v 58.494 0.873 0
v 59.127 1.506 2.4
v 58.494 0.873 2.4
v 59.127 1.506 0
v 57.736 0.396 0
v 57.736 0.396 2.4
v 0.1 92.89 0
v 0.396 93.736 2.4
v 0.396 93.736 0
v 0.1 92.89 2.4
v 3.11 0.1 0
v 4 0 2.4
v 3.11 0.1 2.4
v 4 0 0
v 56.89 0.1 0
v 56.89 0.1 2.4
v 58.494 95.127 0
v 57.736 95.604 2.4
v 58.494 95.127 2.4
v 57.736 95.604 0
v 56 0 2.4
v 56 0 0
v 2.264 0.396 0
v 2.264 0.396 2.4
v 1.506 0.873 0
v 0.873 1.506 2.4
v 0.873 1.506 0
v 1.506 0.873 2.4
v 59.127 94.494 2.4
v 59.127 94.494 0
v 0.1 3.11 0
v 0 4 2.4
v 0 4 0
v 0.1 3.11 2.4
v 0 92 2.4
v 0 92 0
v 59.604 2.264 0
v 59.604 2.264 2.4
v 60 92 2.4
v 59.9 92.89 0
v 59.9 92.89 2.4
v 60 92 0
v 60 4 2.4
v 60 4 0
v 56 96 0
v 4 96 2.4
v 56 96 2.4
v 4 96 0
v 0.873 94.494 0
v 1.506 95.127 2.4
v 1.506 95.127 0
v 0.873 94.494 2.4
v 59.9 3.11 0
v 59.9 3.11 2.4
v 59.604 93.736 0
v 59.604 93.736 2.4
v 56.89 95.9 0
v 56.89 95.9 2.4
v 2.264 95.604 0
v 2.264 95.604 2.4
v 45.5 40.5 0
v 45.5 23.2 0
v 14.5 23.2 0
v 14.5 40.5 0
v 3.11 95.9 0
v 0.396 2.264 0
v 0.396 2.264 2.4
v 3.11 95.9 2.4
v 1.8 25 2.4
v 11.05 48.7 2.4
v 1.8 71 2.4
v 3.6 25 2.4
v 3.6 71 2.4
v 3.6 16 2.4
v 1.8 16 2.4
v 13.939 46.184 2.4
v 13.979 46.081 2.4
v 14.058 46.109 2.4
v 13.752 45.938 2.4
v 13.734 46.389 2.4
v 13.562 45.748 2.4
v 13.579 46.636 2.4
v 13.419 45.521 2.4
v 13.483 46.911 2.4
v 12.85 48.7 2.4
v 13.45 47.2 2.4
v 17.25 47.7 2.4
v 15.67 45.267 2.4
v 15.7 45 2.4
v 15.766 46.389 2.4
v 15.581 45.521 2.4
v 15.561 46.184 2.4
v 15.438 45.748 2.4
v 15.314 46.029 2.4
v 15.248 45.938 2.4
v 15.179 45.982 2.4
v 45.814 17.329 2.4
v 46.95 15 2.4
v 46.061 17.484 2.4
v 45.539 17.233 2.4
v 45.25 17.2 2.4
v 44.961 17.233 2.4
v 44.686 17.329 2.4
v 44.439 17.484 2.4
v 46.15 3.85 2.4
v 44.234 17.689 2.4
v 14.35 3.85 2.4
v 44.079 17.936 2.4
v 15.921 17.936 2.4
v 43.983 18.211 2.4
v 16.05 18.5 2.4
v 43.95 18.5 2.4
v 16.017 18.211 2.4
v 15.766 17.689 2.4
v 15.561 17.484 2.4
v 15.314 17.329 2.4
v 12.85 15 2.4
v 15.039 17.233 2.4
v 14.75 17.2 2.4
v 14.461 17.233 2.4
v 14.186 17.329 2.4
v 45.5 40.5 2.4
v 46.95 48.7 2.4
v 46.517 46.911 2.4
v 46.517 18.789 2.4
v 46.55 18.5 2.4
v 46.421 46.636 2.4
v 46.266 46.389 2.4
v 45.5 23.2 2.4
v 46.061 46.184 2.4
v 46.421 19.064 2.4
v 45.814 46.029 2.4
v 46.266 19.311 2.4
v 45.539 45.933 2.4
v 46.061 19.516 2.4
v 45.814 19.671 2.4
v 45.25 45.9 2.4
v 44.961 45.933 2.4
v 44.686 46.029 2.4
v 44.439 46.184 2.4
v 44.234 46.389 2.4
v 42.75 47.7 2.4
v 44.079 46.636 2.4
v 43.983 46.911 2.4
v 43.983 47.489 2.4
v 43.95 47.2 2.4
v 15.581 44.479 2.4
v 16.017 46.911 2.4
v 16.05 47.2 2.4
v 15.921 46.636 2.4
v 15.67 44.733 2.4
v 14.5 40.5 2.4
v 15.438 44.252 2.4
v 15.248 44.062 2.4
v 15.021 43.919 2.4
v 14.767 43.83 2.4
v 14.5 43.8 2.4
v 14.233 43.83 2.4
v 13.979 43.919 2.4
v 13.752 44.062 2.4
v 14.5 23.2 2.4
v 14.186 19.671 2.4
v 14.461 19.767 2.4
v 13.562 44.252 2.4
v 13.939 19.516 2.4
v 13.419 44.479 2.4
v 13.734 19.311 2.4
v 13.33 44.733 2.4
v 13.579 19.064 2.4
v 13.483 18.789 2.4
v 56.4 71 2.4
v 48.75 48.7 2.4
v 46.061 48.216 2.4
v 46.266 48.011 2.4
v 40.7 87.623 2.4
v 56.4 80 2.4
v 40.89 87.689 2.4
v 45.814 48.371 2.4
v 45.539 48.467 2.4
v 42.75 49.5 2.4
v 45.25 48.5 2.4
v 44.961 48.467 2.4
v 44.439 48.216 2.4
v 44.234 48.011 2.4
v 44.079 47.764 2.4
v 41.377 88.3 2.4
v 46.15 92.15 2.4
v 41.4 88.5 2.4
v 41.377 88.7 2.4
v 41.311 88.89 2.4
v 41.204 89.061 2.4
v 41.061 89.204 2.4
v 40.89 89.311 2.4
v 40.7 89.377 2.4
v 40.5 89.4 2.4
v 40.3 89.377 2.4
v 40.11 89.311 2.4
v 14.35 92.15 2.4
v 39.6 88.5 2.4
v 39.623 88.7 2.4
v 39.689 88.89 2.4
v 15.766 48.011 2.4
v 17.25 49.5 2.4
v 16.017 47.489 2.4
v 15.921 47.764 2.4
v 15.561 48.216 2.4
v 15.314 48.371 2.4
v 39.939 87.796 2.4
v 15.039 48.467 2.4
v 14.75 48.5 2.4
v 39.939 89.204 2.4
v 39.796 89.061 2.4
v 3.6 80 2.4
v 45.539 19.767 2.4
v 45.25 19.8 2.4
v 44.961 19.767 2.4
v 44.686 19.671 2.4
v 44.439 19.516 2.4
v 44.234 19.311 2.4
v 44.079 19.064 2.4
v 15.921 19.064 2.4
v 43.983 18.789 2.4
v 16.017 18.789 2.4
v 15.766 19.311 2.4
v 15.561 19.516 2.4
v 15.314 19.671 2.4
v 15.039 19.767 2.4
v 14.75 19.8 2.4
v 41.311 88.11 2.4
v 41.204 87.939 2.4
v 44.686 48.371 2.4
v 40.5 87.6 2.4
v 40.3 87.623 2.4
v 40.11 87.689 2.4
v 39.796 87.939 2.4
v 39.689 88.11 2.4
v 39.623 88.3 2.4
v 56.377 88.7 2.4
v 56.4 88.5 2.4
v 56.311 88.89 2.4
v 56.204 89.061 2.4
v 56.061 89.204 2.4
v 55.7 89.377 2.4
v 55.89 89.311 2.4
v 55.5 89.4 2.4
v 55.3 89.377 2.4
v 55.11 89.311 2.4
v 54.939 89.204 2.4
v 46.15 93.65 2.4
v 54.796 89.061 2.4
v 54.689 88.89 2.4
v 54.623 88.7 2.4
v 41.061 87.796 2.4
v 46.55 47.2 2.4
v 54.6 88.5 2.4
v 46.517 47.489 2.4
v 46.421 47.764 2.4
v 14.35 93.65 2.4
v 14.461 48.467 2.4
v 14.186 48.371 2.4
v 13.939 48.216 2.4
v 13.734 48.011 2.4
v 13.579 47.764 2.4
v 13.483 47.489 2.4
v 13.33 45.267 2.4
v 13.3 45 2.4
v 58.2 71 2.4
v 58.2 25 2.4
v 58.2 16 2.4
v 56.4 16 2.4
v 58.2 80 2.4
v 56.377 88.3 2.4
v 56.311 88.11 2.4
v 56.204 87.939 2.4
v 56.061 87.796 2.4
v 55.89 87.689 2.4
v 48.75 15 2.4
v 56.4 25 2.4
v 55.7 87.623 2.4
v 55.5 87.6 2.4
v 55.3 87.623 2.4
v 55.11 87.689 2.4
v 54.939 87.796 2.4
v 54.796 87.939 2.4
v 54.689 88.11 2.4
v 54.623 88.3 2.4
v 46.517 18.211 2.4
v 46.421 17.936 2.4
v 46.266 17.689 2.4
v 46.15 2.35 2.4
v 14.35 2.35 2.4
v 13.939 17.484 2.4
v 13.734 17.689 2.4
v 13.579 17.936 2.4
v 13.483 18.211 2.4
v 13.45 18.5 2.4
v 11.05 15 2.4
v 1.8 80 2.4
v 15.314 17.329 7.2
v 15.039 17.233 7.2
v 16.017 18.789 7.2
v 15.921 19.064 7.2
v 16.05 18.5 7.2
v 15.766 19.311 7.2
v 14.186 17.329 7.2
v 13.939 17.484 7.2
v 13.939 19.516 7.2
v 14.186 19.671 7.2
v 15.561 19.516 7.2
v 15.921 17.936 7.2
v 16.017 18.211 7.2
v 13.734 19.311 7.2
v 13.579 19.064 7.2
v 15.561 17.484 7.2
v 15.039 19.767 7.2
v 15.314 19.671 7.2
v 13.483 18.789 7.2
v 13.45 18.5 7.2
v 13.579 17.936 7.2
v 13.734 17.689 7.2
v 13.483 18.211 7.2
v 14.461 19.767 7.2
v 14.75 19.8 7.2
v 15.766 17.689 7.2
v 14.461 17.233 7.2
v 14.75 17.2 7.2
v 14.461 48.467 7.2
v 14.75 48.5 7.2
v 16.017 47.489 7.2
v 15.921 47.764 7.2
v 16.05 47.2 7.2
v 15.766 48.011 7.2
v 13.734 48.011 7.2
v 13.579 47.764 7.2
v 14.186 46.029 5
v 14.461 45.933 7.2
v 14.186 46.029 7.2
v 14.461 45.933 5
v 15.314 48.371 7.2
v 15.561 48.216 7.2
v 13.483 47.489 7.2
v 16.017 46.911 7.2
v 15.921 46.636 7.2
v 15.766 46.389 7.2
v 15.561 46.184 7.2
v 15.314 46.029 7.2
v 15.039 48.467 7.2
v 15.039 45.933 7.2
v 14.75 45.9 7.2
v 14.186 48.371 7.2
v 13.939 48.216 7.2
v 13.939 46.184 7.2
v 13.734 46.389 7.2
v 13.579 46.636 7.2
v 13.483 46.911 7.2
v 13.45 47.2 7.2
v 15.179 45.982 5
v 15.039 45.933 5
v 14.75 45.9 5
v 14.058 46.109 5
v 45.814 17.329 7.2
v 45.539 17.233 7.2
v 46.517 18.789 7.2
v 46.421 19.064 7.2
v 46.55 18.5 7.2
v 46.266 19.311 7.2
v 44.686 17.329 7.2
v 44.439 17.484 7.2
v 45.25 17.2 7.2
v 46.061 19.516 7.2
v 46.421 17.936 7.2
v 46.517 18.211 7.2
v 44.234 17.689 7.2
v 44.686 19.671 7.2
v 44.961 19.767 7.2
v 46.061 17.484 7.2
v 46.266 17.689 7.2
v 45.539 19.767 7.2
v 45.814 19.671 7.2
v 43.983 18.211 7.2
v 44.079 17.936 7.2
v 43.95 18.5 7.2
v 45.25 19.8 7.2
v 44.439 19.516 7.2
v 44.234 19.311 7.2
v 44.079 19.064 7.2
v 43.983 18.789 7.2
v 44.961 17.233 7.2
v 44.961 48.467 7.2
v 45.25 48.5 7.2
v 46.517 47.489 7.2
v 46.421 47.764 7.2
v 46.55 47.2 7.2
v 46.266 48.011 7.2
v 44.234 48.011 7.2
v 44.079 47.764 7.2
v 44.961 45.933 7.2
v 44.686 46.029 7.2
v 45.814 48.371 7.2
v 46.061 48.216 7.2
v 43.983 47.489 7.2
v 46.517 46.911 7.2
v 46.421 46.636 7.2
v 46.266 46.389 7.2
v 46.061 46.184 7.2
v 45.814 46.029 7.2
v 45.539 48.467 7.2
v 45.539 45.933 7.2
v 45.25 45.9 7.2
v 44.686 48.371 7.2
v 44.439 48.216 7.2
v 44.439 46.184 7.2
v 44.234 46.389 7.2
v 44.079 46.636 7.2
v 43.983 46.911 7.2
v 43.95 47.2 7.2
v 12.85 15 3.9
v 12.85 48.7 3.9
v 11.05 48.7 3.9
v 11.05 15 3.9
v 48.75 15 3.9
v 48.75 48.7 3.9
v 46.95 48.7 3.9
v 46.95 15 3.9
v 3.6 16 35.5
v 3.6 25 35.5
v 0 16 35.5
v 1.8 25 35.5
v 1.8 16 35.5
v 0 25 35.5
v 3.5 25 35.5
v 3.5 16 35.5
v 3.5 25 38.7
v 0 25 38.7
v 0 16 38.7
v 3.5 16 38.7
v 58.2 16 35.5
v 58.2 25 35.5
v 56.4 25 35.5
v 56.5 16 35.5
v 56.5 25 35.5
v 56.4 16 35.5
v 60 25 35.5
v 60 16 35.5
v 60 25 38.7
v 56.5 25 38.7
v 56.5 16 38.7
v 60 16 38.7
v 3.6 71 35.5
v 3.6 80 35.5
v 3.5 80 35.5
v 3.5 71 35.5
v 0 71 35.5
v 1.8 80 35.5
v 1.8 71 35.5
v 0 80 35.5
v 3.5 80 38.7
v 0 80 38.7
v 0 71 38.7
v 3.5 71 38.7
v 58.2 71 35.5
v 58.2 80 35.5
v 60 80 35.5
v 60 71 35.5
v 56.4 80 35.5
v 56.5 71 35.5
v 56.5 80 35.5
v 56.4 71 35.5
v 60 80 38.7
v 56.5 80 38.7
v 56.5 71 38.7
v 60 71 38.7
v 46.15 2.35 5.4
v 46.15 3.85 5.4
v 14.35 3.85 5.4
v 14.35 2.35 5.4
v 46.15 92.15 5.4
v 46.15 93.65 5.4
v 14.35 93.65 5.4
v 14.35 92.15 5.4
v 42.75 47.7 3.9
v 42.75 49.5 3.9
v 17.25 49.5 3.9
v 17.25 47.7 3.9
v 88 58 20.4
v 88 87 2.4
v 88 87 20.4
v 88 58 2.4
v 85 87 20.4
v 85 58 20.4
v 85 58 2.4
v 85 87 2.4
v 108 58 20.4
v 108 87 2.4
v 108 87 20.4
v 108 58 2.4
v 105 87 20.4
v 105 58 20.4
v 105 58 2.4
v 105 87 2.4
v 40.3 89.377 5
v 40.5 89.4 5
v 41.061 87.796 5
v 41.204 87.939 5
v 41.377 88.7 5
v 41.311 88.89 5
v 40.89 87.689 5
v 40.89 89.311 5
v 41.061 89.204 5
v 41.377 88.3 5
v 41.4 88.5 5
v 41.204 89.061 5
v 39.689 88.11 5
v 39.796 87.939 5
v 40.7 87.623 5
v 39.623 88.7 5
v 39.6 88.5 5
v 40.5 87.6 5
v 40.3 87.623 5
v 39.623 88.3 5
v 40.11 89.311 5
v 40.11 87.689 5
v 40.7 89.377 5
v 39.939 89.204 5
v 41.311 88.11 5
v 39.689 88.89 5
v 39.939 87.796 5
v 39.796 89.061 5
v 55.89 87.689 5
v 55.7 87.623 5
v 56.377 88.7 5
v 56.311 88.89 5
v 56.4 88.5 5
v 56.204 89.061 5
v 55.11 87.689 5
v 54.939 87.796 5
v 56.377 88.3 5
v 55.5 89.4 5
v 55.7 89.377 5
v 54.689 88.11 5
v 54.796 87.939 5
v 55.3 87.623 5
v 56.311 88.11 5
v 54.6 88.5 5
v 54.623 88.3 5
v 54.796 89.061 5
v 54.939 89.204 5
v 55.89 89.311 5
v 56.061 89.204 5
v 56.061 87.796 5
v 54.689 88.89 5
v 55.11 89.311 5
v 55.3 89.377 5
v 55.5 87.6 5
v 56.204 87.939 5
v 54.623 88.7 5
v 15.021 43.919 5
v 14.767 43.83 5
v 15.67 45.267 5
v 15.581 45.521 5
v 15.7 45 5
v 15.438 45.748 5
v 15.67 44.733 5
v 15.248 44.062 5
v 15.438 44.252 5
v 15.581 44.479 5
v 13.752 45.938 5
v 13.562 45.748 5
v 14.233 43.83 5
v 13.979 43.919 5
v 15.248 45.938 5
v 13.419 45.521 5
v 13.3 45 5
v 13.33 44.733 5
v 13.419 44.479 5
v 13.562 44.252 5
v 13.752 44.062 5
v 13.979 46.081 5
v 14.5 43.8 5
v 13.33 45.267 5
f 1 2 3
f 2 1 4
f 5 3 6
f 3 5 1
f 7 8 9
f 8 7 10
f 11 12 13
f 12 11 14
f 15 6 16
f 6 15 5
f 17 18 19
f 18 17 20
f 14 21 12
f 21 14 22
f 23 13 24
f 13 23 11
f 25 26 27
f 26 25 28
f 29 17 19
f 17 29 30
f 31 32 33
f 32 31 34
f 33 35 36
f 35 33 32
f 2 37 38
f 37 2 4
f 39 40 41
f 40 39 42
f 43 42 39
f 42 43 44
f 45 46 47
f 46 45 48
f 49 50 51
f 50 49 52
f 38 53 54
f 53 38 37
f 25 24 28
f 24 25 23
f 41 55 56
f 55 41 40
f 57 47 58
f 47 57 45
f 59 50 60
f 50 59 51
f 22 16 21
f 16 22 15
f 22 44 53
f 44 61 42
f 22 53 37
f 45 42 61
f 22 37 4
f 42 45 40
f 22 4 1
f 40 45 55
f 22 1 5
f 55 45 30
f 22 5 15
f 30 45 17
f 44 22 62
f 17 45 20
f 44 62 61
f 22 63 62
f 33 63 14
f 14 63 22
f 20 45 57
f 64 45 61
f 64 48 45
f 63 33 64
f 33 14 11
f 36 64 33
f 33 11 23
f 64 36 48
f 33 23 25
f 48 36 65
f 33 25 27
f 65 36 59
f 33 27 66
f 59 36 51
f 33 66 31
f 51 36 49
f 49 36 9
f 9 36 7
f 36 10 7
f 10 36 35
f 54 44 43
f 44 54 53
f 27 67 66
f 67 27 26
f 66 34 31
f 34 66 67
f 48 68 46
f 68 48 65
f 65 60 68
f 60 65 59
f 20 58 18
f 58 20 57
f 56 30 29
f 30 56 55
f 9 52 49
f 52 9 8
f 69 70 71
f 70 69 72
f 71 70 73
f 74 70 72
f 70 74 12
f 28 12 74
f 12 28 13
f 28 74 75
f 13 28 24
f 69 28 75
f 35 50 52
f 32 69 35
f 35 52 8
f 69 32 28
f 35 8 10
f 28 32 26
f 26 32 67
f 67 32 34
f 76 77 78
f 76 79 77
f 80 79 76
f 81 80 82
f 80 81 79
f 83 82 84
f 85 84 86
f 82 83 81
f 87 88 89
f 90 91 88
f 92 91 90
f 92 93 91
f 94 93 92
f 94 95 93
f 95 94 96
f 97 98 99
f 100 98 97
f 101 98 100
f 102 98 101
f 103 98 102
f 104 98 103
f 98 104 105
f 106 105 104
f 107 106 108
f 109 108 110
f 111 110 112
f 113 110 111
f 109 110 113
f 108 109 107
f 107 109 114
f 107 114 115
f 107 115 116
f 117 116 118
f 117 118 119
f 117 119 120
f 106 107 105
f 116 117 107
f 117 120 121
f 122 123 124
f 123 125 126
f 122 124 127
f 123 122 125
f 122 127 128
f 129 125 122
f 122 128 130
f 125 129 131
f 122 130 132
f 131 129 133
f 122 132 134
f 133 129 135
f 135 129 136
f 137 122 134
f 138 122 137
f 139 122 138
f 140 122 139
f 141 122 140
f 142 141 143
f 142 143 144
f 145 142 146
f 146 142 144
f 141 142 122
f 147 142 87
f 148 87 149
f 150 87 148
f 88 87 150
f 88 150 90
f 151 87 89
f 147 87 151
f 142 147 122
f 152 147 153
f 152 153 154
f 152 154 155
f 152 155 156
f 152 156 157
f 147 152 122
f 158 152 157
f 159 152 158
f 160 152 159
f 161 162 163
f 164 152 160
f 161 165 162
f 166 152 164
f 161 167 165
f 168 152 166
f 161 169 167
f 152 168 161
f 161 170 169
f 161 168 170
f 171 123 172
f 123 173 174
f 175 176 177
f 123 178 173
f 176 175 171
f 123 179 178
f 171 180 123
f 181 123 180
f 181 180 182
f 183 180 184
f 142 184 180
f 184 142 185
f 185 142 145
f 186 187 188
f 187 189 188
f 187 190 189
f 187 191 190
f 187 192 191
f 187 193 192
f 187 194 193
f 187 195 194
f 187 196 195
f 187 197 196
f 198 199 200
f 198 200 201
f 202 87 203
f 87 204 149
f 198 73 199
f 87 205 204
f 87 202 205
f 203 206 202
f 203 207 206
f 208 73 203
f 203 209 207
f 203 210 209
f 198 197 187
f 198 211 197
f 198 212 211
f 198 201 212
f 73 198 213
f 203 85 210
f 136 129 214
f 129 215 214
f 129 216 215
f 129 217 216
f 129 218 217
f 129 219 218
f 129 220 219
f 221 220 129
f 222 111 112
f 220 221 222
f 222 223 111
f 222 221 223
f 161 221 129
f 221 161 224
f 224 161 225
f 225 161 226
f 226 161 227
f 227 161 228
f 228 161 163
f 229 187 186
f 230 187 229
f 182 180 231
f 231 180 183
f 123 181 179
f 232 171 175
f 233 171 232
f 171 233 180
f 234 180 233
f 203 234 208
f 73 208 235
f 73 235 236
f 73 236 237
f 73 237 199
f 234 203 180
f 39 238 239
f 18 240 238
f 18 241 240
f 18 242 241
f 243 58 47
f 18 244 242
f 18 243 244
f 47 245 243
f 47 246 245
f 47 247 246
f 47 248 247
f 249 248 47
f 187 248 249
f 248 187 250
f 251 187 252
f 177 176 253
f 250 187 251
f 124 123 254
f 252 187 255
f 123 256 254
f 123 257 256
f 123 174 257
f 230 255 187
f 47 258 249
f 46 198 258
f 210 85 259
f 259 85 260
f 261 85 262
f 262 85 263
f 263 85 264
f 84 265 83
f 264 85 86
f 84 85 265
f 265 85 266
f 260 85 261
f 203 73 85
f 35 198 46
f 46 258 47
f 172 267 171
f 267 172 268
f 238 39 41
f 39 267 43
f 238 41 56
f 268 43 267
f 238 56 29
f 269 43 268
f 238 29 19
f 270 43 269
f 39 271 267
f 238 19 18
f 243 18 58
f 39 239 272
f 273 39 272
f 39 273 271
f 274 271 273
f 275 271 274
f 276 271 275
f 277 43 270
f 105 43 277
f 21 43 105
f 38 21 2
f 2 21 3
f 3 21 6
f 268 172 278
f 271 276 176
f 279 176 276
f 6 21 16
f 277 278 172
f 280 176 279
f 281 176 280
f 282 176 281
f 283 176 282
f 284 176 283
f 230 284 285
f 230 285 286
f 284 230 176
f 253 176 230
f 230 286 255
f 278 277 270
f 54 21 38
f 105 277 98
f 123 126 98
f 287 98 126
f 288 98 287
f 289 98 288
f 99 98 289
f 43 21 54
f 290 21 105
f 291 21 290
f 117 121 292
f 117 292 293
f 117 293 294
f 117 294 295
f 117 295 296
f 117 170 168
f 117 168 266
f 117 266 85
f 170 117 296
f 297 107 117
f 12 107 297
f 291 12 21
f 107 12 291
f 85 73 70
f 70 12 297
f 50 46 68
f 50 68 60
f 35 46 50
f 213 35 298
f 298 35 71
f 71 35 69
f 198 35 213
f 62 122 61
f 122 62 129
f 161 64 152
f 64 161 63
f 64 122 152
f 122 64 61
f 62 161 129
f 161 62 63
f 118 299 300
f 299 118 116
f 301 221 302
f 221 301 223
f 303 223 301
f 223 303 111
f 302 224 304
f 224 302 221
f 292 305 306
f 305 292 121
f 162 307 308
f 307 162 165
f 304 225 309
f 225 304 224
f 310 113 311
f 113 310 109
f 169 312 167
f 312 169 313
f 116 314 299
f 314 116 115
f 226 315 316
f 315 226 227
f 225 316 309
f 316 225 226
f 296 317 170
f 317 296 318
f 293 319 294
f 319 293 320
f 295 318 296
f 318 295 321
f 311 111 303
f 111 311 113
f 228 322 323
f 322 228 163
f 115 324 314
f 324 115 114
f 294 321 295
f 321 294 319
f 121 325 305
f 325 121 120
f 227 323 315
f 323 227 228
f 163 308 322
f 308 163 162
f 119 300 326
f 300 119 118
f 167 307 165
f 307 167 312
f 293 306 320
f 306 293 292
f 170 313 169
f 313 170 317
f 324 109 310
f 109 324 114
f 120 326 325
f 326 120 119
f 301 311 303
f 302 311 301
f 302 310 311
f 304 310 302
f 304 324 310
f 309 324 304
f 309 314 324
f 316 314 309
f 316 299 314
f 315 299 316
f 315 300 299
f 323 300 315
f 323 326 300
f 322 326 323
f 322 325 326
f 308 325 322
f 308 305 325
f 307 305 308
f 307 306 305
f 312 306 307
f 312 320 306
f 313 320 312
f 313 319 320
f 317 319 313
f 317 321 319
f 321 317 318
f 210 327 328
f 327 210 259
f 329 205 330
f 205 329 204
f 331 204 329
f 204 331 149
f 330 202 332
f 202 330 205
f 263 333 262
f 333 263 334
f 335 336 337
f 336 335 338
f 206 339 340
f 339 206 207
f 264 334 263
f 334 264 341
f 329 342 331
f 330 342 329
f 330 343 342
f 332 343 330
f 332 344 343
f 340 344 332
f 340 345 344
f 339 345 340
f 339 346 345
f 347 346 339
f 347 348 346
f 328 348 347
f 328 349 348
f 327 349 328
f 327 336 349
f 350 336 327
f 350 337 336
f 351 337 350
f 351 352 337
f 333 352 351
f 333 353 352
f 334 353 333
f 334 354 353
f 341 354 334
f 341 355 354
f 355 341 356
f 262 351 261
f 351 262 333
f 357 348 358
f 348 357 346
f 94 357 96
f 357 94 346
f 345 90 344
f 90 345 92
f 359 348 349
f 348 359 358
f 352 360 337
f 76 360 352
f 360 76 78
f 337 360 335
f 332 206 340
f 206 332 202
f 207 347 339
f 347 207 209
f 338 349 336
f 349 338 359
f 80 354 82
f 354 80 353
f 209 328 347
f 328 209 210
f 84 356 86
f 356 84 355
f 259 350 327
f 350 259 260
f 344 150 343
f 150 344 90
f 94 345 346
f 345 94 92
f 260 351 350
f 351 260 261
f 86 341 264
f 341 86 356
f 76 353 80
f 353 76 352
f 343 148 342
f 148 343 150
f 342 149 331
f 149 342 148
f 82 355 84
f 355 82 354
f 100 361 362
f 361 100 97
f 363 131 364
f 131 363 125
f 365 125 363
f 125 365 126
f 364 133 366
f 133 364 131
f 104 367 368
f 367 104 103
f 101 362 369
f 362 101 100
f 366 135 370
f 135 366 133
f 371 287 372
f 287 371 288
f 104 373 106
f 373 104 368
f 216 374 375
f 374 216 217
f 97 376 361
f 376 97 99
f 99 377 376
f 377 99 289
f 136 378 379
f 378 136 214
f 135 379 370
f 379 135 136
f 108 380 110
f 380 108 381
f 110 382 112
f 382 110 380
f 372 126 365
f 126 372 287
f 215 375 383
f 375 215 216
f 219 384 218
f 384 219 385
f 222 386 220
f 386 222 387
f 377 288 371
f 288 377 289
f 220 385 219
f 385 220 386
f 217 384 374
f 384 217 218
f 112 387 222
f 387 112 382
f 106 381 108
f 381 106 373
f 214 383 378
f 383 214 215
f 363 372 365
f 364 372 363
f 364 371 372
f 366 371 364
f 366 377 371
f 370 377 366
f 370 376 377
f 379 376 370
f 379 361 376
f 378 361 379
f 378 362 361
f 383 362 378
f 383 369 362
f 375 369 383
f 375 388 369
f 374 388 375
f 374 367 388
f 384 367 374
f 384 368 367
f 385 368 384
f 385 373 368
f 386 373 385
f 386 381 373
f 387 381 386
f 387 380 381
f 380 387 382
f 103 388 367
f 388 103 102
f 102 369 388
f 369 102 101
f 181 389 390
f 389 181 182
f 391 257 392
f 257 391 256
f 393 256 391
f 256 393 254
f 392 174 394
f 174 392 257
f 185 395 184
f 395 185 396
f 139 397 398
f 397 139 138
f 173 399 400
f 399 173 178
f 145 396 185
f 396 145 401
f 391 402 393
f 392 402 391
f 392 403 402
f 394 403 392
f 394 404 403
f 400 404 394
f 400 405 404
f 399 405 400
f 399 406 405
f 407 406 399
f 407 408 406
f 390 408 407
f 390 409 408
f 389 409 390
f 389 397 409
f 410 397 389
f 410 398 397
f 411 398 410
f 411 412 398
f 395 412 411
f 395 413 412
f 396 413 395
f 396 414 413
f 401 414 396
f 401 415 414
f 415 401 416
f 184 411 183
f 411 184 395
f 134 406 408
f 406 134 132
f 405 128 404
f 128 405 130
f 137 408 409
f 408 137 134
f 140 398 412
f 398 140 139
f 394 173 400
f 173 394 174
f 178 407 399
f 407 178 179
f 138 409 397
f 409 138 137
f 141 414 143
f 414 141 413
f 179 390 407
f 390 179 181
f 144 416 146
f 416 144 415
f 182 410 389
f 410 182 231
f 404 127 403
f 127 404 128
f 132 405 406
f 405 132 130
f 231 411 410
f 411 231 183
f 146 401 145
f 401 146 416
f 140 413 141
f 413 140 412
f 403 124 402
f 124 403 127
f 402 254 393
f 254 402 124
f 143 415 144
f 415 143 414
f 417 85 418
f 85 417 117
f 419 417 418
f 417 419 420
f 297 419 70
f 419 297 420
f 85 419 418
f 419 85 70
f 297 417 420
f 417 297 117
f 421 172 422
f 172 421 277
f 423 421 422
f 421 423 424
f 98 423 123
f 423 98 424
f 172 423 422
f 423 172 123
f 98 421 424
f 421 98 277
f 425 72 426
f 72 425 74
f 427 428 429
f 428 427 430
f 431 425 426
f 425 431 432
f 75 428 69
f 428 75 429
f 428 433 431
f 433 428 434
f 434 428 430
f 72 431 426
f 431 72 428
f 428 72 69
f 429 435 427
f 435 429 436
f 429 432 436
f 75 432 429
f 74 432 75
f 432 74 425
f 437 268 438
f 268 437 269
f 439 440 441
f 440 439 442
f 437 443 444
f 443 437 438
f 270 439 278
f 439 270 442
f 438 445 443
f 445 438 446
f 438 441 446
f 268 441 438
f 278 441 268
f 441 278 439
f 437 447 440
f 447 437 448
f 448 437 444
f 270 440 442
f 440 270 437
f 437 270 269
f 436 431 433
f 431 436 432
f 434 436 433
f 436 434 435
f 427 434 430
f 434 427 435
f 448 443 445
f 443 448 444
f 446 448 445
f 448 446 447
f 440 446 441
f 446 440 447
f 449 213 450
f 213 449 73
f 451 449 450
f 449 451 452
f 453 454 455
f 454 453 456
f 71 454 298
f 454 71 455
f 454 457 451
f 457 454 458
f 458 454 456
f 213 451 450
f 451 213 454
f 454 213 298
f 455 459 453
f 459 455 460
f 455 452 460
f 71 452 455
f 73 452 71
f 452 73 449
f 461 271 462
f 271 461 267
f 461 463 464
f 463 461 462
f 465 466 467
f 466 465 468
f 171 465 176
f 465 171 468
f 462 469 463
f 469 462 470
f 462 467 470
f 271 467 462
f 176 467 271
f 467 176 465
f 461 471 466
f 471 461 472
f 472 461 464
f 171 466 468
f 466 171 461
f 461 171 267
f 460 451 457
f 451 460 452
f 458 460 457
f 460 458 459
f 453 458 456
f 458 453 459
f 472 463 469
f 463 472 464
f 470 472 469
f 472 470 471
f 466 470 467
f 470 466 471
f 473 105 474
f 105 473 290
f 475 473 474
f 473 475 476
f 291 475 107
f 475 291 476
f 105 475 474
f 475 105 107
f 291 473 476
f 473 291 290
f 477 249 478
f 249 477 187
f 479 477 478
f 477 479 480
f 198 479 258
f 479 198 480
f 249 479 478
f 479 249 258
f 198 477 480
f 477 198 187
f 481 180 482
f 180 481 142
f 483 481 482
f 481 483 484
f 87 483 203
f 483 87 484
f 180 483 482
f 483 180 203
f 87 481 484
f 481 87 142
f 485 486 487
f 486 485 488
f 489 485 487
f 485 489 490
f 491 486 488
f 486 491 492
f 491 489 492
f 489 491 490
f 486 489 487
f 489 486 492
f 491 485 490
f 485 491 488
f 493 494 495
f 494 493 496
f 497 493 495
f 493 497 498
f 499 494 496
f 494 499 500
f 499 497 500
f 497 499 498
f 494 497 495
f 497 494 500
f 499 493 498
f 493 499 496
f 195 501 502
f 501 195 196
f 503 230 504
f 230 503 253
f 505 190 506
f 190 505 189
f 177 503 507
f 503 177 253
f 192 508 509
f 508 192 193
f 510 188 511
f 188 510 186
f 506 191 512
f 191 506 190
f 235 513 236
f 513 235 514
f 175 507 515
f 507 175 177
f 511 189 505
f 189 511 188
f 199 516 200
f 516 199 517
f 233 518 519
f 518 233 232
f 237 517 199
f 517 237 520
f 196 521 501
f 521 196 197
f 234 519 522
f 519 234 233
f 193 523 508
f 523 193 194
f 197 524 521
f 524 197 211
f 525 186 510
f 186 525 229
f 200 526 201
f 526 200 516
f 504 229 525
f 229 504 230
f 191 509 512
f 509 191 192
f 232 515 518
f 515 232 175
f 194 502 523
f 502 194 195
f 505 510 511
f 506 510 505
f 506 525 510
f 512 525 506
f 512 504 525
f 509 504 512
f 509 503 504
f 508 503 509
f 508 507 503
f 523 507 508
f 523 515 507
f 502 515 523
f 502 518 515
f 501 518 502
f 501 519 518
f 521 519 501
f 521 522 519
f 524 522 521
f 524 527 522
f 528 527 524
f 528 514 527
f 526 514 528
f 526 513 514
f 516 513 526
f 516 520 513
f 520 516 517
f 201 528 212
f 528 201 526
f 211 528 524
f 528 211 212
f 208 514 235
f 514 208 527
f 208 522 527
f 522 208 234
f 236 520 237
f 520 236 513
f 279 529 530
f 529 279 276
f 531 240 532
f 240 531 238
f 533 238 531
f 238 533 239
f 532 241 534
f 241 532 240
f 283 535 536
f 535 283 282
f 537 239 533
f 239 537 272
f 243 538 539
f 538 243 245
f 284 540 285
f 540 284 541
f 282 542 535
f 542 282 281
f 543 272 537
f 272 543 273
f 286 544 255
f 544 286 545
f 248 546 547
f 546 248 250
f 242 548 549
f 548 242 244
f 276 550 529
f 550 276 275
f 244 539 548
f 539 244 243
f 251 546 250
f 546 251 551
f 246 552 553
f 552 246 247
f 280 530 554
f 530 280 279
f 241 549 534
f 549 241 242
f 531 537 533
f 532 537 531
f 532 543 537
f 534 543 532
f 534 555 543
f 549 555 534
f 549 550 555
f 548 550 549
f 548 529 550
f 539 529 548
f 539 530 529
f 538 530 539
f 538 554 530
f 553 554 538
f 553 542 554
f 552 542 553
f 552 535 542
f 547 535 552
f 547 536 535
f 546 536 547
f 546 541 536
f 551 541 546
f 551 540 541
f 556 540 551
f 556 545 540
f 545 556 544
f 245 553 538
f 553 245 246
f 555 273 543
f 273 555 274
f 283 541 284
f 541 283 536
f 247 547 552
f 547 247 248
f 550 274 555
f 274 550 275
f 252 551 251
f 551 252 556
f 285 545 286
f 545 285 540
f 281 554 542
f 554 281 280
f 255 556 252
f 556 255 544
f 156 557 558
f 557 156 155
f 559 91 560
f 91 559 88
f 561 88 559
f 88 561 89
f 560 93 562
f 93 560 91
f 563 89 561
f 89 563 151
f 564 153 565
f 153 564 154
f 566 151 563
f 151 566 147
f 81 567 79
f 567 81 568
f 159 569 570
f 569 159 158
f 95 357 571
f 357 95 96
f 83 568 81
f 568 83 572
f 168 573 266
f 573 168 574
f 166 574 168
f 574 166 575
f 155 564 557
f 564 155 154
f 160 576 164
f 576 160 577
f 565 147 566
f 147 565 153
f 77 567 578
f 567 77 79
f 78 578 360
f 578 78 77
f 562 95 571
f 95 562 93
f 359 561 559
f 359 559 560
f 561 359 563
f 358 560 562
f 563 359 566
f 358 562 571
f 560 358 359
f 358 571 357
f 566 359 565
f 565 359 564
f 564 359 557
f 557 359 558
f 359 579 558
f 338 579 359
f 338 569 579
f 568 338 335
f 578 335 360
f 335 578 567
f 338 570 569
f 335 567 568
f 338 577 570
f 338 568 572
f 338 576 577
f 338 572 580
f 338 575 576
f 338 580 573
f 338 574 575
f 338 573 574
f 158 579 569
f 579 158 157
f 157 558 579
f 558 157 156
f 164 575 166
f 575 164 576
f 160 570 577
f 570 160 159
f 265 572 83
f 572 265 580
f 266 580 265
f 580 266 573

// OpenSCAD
// file: litvinov_oled_case.scad
/*
  HC Verva Litvínov OLED — snap-fit enclosure, revision A
  Units: mm.  Designed around measured/declared components:
    LiPo 855085: 85 x 50 x 8.5
    ESP32-C3 + headers/buzzer: 40 x 30 (outline; held by rails)
    SH1106 OLED module: 35.4 x 33.5
    USB-C TP4056: 20 x 15 x 5 (per supplied product image)
    SS12F15 slide switch: adjust switch_cut_* after measuring the purchased variant.

  Two printed parts only: FRONT_BEZEL and REAR_TRAY.
  No screws: four printed flex clips latch the bezel into the tray.
*/

$fn = 28;
// Default is a two-piece print plate; wrappers select a part without overwriting it.
current_part = is_undef(part) ? "print_plate" : part;  // front, rear, print_plate, or assembly
fit = 0.35;           // ABS snap clearance; tune 0.30–0.45 for the actual filament/printer
wall = 2.0;

// Overall outside dimensions. Battery dictates the 60 mm width / 96 mm height footprint.
case_w = 60;
case_h = 96;
case_d = 38;          // allows 8.5 mm LiPo + C3 headers/buzzer above it
front_t = 2.4;
corner_r = 4;

// Battery cavity: protected cell is 85 x 50 x 8.5 mm.
batt_w = 52.0;
batt_h = 87.0;
batt_t = 9.5;         // 1 mm vertical clearance; add thin foam, never compress LiPo
batt_x = (case_w - batt_w)/2;
batt_y = 4.5;

// 1.3" 7-pin OLED from the supplied mechanical drawing.
// PCB 35.50 x 33.70 mm; 4 mounting holes Ø3.00 mm, 31.50 x 29.70 mm pitch.
oled_pcb_w = 35.5;
oled_pcb_h = 33.7;
oled_view_w = 31.0;     // 29.42 mm active width + 0.58 mm assembly clearance
oled_view_h = 17.3;     // 14.70 mm active height + 0.60 mm assembly clearance
oled_y = 15;
oled_x = (case_w-oled_pcb_w)/2;
oled_hole_dia = 3.0;
oled_hole_x = 2.5;      // from each PCB side; 35.5 - 2*2 = 31.5 mm pitch
oled_hole_y = 2.5;      // from each PCB side; 33.7 - 2*2 = 29.7 mm pitch
oled_pin_dia = 2.6;     // leaves 0.4 mm radial clearance in an Ø3.0 hole
// 2.8 mm extends 1.6 mm past a nominal 1.2 mm PCB for heat staking.
oled_pin_h = 4.8;

// 2 sajtny pro ESP
translate([85, 58, front_t])
    cube([3, 29, 18]);

translate([105, 58, front_t])
    cube([3, 29, 18]);
    
// ESP32-C3 board outline supplied by user. Retained by rails, not guessed hole locations.
c3_w = 30;
c3_h = 40;
c3_x = (case_w-c3_w)/2;
c3_y = 51;
c3_board_z = batt_t + 1.2;
rail_h = 2.2;
rail_t = 1.5;

// Rear access: TP4056 Type-C module is 20 x 15 x 5 mm from supplied product image.
charge_w = 20;
charge_h = 15;
charge_x = 6;
charge_y = case_h - charge_h ;
usb_slot_w = 10.2;
usb_slot_h = 4.2;

// SS12F15 slider. The listing has several lever heights; use H4 starting point.
switch_slot_w = 8.0;
switch_slot_h = 3.4;
switch_x = case_w - 8 - switch_slot_w;
switch_y = charge_y + 5.8;

// 2 fixační piny pro vypínač – uprav si pozici podle skutečného kusu
switch_pin_d = 1.8;
switch_pin_h = 3.0;

// vlevo od vypínače
translate([switch_x - 3.5, switch_y + switch_slot_h/2, wall])
    cylinder(d=switch_pin_d, h=switch_pin_h);

// vpravo od vypínače
translate([switch_x + switch_slot_w + 3.5, switch_y + switch_slot_h/2, wall])
    cylinder(d=switch_pin_d, h=switch_pin_h);
   
   translate([14.5, 45, wall])
    cylinder(h=3, d=2.4);

    
// Snap joints: one on each side near top/bottom. The bezel is inserted from the front;
// its hooks engage low in the rear tray, on the opposite (rear) side of the joint.
clip_w = 9;
clip_h = 3.2;
clip_z = case_d - 2.5;
clip_window_z = case_d - clip_z+2.5 - clip_h;

module rounded_box(w,h,d,r=3) {
  hull() for (x=[r,w-r]) for (y=[r,h-r])
    translate([x,y,0]) cylinder(h=d,r=r);
}

module rear_tray() {
  difference() {
    rounded_box(case_w,case_h,case_d,corner_r);
    // Main interior, leaves rear floor and side walls.
    translate([wall,wall,wall]) rounded_box(case_w-2*wall,case_h-2*wall,case_d-wall+0.1,corner_r-wall);
    // Rear-face openings: USB-C charge socket and slide switch, both accessible from back.
    // The TP4056 lies flat on the inner rear wall, held by thin VHB tape.
    translate([charge_x + (charge_w-usb_slot_w)/2, charge_y + (charge_h-usb_slot_h)/2, -0.1])
      cube([usb_slot_w,usb_slot_h,wall+0.3]);
    translate([switch_x, switch_y, -0.1])
      cube([switch_slot_w,switch_slot_h,wall+0.3]);
    // Four rear-tray latching windows; hooks come from the front bezel and catch here.
    for (y=[16,case_h-16-clip_w])
      for (x=[-0.1,case_w-wall+0.1])
        translate([x,y,clip_window_z]) cube([wall+0.2,clip_w,clip_h+fit]);
  }

  // Battery is held by its close-fitting pocket plus a thin foam tape pad on the floor.
  // There are deliberately no raised battery lips: this keeps the tray support-free and
  // avoids any sharp printed feature against the LiPo pouch.

  // TP4056 is fixed vertically to the rear wall with thin VHB/foam tape, aligned with
  // the USB-C opening. A printed horizontal shelf would need a support underneath.

  // ESP32-C3 is fixed vertically to the *inside of the front bezel* below the OLED
  // using a thin insulating VHB/foam tape pad. Never tape it onto the LiPo: its
  // underside pins must remain clear of the battery pouch. No guessed mounting holes
  // or suspended rails are used, so the complete rear tray remains support-free.
}

module front_bezel() {
  difference() {
    rounded_box(case_w,case_h,front_t,corner_r);
    // OLED viewing window, centred over the module.
    translate([(case_w-oled_view_w)/2, oled_y+(oled_pcb_h-oled_view_h)/2, -0.1])
      cube([oled_view_w,oled_view_h,front_t+0.2]);
  }

// Four compliant hooks engage rear tray windows.
// aretační lišty jsou součástí víčka
translate([wall + fit+12, wall + fit, front_t])
    cube([case_w - 12*(wall + fit), 1.5, 3]);

translate([wall + fit+12, case_h - wall - fit - 1.5, front_t])
    cube([case_w - 12*(wall + fit), 1.5, 3]);
  
  // Four Ø2.2 heat-stake pins pass through the OLED's 4 × Ø3.0 mounting holes.
  // They start at the bezel's inner face; melt only the top 0.8–1.0 mm after dry-fitting.
  for (px=[oled_hole_x, oled_pcb_w-oled_hole_x])
    for (py=[oled_hole_y, oled_pcb_h-oled_hole_y])
      translate([oled_x+px, oled_y+py+1, front_t])
        cylinder(h=oled_pin_h, d=oled_pin_dia);

  // Edge guides centre the PCB during assembly; the heat-stake pins provide retention.
  for (x=[oled_x-1.2, oled_x+oled_pcb_w-0.8])
    translate([x,oled_y,front_t]) cube([1.8,oled_pcb_h,1.5]);
  //translate([oled_x,oled_y-0.8,front_t]) cube([oled_pcb_w,1.8,1.5]);
  translate([oled_x+5,oled_y+oled_pcb_h-1.0,front_t]) cube([oled_pcb_w-10,1.8,1.5]);

  // Four compliant hooks engage rear tray windows. Print front face down.
  for (y=[16,case_h-16-clip_w]) {
    translate([wall-0.2,y,front_t]) cube([1.8,clip_w,clip_z-front_t]);
    translate([case_w-wall-1.6,y,front_t]) cube([1.8,clip_w,clip_z-front_t]);
    translate([0,y,clip_z]) cube([wall+1.5,clip_w,clip_h]);
    translate([case_w-wall-1.5,y,clip_z]) cube([wall+1.5,clip_w,clip_h]);
  }
}

if (current_part == "rear") rear_tray();
else if (current_part == "front") front_bezel();
else if (current_part == "print_plate") {
  // Two physically separate parts, 8 mm apart, both in their support-free print orientation.
  rear_tray();
  translate([case_w+8,0,0]) front_bezel();
}
else if (current_part == "assembly") {
  // Visual assembly only — never use this mode to export a printable STL.
  rear_tray();
  translate([0,case_h,case_d]) rotate([180,0,0]) front_bezel();
}
else assert(false, str("Unknown part: ", current_part, "; use front, rear, print_plate, or assembly"));
// main file
// Export this file as STL: front OLED bezel only, support-free orientation.
part = "front";
include <litvinov_oled_case.scad>;
